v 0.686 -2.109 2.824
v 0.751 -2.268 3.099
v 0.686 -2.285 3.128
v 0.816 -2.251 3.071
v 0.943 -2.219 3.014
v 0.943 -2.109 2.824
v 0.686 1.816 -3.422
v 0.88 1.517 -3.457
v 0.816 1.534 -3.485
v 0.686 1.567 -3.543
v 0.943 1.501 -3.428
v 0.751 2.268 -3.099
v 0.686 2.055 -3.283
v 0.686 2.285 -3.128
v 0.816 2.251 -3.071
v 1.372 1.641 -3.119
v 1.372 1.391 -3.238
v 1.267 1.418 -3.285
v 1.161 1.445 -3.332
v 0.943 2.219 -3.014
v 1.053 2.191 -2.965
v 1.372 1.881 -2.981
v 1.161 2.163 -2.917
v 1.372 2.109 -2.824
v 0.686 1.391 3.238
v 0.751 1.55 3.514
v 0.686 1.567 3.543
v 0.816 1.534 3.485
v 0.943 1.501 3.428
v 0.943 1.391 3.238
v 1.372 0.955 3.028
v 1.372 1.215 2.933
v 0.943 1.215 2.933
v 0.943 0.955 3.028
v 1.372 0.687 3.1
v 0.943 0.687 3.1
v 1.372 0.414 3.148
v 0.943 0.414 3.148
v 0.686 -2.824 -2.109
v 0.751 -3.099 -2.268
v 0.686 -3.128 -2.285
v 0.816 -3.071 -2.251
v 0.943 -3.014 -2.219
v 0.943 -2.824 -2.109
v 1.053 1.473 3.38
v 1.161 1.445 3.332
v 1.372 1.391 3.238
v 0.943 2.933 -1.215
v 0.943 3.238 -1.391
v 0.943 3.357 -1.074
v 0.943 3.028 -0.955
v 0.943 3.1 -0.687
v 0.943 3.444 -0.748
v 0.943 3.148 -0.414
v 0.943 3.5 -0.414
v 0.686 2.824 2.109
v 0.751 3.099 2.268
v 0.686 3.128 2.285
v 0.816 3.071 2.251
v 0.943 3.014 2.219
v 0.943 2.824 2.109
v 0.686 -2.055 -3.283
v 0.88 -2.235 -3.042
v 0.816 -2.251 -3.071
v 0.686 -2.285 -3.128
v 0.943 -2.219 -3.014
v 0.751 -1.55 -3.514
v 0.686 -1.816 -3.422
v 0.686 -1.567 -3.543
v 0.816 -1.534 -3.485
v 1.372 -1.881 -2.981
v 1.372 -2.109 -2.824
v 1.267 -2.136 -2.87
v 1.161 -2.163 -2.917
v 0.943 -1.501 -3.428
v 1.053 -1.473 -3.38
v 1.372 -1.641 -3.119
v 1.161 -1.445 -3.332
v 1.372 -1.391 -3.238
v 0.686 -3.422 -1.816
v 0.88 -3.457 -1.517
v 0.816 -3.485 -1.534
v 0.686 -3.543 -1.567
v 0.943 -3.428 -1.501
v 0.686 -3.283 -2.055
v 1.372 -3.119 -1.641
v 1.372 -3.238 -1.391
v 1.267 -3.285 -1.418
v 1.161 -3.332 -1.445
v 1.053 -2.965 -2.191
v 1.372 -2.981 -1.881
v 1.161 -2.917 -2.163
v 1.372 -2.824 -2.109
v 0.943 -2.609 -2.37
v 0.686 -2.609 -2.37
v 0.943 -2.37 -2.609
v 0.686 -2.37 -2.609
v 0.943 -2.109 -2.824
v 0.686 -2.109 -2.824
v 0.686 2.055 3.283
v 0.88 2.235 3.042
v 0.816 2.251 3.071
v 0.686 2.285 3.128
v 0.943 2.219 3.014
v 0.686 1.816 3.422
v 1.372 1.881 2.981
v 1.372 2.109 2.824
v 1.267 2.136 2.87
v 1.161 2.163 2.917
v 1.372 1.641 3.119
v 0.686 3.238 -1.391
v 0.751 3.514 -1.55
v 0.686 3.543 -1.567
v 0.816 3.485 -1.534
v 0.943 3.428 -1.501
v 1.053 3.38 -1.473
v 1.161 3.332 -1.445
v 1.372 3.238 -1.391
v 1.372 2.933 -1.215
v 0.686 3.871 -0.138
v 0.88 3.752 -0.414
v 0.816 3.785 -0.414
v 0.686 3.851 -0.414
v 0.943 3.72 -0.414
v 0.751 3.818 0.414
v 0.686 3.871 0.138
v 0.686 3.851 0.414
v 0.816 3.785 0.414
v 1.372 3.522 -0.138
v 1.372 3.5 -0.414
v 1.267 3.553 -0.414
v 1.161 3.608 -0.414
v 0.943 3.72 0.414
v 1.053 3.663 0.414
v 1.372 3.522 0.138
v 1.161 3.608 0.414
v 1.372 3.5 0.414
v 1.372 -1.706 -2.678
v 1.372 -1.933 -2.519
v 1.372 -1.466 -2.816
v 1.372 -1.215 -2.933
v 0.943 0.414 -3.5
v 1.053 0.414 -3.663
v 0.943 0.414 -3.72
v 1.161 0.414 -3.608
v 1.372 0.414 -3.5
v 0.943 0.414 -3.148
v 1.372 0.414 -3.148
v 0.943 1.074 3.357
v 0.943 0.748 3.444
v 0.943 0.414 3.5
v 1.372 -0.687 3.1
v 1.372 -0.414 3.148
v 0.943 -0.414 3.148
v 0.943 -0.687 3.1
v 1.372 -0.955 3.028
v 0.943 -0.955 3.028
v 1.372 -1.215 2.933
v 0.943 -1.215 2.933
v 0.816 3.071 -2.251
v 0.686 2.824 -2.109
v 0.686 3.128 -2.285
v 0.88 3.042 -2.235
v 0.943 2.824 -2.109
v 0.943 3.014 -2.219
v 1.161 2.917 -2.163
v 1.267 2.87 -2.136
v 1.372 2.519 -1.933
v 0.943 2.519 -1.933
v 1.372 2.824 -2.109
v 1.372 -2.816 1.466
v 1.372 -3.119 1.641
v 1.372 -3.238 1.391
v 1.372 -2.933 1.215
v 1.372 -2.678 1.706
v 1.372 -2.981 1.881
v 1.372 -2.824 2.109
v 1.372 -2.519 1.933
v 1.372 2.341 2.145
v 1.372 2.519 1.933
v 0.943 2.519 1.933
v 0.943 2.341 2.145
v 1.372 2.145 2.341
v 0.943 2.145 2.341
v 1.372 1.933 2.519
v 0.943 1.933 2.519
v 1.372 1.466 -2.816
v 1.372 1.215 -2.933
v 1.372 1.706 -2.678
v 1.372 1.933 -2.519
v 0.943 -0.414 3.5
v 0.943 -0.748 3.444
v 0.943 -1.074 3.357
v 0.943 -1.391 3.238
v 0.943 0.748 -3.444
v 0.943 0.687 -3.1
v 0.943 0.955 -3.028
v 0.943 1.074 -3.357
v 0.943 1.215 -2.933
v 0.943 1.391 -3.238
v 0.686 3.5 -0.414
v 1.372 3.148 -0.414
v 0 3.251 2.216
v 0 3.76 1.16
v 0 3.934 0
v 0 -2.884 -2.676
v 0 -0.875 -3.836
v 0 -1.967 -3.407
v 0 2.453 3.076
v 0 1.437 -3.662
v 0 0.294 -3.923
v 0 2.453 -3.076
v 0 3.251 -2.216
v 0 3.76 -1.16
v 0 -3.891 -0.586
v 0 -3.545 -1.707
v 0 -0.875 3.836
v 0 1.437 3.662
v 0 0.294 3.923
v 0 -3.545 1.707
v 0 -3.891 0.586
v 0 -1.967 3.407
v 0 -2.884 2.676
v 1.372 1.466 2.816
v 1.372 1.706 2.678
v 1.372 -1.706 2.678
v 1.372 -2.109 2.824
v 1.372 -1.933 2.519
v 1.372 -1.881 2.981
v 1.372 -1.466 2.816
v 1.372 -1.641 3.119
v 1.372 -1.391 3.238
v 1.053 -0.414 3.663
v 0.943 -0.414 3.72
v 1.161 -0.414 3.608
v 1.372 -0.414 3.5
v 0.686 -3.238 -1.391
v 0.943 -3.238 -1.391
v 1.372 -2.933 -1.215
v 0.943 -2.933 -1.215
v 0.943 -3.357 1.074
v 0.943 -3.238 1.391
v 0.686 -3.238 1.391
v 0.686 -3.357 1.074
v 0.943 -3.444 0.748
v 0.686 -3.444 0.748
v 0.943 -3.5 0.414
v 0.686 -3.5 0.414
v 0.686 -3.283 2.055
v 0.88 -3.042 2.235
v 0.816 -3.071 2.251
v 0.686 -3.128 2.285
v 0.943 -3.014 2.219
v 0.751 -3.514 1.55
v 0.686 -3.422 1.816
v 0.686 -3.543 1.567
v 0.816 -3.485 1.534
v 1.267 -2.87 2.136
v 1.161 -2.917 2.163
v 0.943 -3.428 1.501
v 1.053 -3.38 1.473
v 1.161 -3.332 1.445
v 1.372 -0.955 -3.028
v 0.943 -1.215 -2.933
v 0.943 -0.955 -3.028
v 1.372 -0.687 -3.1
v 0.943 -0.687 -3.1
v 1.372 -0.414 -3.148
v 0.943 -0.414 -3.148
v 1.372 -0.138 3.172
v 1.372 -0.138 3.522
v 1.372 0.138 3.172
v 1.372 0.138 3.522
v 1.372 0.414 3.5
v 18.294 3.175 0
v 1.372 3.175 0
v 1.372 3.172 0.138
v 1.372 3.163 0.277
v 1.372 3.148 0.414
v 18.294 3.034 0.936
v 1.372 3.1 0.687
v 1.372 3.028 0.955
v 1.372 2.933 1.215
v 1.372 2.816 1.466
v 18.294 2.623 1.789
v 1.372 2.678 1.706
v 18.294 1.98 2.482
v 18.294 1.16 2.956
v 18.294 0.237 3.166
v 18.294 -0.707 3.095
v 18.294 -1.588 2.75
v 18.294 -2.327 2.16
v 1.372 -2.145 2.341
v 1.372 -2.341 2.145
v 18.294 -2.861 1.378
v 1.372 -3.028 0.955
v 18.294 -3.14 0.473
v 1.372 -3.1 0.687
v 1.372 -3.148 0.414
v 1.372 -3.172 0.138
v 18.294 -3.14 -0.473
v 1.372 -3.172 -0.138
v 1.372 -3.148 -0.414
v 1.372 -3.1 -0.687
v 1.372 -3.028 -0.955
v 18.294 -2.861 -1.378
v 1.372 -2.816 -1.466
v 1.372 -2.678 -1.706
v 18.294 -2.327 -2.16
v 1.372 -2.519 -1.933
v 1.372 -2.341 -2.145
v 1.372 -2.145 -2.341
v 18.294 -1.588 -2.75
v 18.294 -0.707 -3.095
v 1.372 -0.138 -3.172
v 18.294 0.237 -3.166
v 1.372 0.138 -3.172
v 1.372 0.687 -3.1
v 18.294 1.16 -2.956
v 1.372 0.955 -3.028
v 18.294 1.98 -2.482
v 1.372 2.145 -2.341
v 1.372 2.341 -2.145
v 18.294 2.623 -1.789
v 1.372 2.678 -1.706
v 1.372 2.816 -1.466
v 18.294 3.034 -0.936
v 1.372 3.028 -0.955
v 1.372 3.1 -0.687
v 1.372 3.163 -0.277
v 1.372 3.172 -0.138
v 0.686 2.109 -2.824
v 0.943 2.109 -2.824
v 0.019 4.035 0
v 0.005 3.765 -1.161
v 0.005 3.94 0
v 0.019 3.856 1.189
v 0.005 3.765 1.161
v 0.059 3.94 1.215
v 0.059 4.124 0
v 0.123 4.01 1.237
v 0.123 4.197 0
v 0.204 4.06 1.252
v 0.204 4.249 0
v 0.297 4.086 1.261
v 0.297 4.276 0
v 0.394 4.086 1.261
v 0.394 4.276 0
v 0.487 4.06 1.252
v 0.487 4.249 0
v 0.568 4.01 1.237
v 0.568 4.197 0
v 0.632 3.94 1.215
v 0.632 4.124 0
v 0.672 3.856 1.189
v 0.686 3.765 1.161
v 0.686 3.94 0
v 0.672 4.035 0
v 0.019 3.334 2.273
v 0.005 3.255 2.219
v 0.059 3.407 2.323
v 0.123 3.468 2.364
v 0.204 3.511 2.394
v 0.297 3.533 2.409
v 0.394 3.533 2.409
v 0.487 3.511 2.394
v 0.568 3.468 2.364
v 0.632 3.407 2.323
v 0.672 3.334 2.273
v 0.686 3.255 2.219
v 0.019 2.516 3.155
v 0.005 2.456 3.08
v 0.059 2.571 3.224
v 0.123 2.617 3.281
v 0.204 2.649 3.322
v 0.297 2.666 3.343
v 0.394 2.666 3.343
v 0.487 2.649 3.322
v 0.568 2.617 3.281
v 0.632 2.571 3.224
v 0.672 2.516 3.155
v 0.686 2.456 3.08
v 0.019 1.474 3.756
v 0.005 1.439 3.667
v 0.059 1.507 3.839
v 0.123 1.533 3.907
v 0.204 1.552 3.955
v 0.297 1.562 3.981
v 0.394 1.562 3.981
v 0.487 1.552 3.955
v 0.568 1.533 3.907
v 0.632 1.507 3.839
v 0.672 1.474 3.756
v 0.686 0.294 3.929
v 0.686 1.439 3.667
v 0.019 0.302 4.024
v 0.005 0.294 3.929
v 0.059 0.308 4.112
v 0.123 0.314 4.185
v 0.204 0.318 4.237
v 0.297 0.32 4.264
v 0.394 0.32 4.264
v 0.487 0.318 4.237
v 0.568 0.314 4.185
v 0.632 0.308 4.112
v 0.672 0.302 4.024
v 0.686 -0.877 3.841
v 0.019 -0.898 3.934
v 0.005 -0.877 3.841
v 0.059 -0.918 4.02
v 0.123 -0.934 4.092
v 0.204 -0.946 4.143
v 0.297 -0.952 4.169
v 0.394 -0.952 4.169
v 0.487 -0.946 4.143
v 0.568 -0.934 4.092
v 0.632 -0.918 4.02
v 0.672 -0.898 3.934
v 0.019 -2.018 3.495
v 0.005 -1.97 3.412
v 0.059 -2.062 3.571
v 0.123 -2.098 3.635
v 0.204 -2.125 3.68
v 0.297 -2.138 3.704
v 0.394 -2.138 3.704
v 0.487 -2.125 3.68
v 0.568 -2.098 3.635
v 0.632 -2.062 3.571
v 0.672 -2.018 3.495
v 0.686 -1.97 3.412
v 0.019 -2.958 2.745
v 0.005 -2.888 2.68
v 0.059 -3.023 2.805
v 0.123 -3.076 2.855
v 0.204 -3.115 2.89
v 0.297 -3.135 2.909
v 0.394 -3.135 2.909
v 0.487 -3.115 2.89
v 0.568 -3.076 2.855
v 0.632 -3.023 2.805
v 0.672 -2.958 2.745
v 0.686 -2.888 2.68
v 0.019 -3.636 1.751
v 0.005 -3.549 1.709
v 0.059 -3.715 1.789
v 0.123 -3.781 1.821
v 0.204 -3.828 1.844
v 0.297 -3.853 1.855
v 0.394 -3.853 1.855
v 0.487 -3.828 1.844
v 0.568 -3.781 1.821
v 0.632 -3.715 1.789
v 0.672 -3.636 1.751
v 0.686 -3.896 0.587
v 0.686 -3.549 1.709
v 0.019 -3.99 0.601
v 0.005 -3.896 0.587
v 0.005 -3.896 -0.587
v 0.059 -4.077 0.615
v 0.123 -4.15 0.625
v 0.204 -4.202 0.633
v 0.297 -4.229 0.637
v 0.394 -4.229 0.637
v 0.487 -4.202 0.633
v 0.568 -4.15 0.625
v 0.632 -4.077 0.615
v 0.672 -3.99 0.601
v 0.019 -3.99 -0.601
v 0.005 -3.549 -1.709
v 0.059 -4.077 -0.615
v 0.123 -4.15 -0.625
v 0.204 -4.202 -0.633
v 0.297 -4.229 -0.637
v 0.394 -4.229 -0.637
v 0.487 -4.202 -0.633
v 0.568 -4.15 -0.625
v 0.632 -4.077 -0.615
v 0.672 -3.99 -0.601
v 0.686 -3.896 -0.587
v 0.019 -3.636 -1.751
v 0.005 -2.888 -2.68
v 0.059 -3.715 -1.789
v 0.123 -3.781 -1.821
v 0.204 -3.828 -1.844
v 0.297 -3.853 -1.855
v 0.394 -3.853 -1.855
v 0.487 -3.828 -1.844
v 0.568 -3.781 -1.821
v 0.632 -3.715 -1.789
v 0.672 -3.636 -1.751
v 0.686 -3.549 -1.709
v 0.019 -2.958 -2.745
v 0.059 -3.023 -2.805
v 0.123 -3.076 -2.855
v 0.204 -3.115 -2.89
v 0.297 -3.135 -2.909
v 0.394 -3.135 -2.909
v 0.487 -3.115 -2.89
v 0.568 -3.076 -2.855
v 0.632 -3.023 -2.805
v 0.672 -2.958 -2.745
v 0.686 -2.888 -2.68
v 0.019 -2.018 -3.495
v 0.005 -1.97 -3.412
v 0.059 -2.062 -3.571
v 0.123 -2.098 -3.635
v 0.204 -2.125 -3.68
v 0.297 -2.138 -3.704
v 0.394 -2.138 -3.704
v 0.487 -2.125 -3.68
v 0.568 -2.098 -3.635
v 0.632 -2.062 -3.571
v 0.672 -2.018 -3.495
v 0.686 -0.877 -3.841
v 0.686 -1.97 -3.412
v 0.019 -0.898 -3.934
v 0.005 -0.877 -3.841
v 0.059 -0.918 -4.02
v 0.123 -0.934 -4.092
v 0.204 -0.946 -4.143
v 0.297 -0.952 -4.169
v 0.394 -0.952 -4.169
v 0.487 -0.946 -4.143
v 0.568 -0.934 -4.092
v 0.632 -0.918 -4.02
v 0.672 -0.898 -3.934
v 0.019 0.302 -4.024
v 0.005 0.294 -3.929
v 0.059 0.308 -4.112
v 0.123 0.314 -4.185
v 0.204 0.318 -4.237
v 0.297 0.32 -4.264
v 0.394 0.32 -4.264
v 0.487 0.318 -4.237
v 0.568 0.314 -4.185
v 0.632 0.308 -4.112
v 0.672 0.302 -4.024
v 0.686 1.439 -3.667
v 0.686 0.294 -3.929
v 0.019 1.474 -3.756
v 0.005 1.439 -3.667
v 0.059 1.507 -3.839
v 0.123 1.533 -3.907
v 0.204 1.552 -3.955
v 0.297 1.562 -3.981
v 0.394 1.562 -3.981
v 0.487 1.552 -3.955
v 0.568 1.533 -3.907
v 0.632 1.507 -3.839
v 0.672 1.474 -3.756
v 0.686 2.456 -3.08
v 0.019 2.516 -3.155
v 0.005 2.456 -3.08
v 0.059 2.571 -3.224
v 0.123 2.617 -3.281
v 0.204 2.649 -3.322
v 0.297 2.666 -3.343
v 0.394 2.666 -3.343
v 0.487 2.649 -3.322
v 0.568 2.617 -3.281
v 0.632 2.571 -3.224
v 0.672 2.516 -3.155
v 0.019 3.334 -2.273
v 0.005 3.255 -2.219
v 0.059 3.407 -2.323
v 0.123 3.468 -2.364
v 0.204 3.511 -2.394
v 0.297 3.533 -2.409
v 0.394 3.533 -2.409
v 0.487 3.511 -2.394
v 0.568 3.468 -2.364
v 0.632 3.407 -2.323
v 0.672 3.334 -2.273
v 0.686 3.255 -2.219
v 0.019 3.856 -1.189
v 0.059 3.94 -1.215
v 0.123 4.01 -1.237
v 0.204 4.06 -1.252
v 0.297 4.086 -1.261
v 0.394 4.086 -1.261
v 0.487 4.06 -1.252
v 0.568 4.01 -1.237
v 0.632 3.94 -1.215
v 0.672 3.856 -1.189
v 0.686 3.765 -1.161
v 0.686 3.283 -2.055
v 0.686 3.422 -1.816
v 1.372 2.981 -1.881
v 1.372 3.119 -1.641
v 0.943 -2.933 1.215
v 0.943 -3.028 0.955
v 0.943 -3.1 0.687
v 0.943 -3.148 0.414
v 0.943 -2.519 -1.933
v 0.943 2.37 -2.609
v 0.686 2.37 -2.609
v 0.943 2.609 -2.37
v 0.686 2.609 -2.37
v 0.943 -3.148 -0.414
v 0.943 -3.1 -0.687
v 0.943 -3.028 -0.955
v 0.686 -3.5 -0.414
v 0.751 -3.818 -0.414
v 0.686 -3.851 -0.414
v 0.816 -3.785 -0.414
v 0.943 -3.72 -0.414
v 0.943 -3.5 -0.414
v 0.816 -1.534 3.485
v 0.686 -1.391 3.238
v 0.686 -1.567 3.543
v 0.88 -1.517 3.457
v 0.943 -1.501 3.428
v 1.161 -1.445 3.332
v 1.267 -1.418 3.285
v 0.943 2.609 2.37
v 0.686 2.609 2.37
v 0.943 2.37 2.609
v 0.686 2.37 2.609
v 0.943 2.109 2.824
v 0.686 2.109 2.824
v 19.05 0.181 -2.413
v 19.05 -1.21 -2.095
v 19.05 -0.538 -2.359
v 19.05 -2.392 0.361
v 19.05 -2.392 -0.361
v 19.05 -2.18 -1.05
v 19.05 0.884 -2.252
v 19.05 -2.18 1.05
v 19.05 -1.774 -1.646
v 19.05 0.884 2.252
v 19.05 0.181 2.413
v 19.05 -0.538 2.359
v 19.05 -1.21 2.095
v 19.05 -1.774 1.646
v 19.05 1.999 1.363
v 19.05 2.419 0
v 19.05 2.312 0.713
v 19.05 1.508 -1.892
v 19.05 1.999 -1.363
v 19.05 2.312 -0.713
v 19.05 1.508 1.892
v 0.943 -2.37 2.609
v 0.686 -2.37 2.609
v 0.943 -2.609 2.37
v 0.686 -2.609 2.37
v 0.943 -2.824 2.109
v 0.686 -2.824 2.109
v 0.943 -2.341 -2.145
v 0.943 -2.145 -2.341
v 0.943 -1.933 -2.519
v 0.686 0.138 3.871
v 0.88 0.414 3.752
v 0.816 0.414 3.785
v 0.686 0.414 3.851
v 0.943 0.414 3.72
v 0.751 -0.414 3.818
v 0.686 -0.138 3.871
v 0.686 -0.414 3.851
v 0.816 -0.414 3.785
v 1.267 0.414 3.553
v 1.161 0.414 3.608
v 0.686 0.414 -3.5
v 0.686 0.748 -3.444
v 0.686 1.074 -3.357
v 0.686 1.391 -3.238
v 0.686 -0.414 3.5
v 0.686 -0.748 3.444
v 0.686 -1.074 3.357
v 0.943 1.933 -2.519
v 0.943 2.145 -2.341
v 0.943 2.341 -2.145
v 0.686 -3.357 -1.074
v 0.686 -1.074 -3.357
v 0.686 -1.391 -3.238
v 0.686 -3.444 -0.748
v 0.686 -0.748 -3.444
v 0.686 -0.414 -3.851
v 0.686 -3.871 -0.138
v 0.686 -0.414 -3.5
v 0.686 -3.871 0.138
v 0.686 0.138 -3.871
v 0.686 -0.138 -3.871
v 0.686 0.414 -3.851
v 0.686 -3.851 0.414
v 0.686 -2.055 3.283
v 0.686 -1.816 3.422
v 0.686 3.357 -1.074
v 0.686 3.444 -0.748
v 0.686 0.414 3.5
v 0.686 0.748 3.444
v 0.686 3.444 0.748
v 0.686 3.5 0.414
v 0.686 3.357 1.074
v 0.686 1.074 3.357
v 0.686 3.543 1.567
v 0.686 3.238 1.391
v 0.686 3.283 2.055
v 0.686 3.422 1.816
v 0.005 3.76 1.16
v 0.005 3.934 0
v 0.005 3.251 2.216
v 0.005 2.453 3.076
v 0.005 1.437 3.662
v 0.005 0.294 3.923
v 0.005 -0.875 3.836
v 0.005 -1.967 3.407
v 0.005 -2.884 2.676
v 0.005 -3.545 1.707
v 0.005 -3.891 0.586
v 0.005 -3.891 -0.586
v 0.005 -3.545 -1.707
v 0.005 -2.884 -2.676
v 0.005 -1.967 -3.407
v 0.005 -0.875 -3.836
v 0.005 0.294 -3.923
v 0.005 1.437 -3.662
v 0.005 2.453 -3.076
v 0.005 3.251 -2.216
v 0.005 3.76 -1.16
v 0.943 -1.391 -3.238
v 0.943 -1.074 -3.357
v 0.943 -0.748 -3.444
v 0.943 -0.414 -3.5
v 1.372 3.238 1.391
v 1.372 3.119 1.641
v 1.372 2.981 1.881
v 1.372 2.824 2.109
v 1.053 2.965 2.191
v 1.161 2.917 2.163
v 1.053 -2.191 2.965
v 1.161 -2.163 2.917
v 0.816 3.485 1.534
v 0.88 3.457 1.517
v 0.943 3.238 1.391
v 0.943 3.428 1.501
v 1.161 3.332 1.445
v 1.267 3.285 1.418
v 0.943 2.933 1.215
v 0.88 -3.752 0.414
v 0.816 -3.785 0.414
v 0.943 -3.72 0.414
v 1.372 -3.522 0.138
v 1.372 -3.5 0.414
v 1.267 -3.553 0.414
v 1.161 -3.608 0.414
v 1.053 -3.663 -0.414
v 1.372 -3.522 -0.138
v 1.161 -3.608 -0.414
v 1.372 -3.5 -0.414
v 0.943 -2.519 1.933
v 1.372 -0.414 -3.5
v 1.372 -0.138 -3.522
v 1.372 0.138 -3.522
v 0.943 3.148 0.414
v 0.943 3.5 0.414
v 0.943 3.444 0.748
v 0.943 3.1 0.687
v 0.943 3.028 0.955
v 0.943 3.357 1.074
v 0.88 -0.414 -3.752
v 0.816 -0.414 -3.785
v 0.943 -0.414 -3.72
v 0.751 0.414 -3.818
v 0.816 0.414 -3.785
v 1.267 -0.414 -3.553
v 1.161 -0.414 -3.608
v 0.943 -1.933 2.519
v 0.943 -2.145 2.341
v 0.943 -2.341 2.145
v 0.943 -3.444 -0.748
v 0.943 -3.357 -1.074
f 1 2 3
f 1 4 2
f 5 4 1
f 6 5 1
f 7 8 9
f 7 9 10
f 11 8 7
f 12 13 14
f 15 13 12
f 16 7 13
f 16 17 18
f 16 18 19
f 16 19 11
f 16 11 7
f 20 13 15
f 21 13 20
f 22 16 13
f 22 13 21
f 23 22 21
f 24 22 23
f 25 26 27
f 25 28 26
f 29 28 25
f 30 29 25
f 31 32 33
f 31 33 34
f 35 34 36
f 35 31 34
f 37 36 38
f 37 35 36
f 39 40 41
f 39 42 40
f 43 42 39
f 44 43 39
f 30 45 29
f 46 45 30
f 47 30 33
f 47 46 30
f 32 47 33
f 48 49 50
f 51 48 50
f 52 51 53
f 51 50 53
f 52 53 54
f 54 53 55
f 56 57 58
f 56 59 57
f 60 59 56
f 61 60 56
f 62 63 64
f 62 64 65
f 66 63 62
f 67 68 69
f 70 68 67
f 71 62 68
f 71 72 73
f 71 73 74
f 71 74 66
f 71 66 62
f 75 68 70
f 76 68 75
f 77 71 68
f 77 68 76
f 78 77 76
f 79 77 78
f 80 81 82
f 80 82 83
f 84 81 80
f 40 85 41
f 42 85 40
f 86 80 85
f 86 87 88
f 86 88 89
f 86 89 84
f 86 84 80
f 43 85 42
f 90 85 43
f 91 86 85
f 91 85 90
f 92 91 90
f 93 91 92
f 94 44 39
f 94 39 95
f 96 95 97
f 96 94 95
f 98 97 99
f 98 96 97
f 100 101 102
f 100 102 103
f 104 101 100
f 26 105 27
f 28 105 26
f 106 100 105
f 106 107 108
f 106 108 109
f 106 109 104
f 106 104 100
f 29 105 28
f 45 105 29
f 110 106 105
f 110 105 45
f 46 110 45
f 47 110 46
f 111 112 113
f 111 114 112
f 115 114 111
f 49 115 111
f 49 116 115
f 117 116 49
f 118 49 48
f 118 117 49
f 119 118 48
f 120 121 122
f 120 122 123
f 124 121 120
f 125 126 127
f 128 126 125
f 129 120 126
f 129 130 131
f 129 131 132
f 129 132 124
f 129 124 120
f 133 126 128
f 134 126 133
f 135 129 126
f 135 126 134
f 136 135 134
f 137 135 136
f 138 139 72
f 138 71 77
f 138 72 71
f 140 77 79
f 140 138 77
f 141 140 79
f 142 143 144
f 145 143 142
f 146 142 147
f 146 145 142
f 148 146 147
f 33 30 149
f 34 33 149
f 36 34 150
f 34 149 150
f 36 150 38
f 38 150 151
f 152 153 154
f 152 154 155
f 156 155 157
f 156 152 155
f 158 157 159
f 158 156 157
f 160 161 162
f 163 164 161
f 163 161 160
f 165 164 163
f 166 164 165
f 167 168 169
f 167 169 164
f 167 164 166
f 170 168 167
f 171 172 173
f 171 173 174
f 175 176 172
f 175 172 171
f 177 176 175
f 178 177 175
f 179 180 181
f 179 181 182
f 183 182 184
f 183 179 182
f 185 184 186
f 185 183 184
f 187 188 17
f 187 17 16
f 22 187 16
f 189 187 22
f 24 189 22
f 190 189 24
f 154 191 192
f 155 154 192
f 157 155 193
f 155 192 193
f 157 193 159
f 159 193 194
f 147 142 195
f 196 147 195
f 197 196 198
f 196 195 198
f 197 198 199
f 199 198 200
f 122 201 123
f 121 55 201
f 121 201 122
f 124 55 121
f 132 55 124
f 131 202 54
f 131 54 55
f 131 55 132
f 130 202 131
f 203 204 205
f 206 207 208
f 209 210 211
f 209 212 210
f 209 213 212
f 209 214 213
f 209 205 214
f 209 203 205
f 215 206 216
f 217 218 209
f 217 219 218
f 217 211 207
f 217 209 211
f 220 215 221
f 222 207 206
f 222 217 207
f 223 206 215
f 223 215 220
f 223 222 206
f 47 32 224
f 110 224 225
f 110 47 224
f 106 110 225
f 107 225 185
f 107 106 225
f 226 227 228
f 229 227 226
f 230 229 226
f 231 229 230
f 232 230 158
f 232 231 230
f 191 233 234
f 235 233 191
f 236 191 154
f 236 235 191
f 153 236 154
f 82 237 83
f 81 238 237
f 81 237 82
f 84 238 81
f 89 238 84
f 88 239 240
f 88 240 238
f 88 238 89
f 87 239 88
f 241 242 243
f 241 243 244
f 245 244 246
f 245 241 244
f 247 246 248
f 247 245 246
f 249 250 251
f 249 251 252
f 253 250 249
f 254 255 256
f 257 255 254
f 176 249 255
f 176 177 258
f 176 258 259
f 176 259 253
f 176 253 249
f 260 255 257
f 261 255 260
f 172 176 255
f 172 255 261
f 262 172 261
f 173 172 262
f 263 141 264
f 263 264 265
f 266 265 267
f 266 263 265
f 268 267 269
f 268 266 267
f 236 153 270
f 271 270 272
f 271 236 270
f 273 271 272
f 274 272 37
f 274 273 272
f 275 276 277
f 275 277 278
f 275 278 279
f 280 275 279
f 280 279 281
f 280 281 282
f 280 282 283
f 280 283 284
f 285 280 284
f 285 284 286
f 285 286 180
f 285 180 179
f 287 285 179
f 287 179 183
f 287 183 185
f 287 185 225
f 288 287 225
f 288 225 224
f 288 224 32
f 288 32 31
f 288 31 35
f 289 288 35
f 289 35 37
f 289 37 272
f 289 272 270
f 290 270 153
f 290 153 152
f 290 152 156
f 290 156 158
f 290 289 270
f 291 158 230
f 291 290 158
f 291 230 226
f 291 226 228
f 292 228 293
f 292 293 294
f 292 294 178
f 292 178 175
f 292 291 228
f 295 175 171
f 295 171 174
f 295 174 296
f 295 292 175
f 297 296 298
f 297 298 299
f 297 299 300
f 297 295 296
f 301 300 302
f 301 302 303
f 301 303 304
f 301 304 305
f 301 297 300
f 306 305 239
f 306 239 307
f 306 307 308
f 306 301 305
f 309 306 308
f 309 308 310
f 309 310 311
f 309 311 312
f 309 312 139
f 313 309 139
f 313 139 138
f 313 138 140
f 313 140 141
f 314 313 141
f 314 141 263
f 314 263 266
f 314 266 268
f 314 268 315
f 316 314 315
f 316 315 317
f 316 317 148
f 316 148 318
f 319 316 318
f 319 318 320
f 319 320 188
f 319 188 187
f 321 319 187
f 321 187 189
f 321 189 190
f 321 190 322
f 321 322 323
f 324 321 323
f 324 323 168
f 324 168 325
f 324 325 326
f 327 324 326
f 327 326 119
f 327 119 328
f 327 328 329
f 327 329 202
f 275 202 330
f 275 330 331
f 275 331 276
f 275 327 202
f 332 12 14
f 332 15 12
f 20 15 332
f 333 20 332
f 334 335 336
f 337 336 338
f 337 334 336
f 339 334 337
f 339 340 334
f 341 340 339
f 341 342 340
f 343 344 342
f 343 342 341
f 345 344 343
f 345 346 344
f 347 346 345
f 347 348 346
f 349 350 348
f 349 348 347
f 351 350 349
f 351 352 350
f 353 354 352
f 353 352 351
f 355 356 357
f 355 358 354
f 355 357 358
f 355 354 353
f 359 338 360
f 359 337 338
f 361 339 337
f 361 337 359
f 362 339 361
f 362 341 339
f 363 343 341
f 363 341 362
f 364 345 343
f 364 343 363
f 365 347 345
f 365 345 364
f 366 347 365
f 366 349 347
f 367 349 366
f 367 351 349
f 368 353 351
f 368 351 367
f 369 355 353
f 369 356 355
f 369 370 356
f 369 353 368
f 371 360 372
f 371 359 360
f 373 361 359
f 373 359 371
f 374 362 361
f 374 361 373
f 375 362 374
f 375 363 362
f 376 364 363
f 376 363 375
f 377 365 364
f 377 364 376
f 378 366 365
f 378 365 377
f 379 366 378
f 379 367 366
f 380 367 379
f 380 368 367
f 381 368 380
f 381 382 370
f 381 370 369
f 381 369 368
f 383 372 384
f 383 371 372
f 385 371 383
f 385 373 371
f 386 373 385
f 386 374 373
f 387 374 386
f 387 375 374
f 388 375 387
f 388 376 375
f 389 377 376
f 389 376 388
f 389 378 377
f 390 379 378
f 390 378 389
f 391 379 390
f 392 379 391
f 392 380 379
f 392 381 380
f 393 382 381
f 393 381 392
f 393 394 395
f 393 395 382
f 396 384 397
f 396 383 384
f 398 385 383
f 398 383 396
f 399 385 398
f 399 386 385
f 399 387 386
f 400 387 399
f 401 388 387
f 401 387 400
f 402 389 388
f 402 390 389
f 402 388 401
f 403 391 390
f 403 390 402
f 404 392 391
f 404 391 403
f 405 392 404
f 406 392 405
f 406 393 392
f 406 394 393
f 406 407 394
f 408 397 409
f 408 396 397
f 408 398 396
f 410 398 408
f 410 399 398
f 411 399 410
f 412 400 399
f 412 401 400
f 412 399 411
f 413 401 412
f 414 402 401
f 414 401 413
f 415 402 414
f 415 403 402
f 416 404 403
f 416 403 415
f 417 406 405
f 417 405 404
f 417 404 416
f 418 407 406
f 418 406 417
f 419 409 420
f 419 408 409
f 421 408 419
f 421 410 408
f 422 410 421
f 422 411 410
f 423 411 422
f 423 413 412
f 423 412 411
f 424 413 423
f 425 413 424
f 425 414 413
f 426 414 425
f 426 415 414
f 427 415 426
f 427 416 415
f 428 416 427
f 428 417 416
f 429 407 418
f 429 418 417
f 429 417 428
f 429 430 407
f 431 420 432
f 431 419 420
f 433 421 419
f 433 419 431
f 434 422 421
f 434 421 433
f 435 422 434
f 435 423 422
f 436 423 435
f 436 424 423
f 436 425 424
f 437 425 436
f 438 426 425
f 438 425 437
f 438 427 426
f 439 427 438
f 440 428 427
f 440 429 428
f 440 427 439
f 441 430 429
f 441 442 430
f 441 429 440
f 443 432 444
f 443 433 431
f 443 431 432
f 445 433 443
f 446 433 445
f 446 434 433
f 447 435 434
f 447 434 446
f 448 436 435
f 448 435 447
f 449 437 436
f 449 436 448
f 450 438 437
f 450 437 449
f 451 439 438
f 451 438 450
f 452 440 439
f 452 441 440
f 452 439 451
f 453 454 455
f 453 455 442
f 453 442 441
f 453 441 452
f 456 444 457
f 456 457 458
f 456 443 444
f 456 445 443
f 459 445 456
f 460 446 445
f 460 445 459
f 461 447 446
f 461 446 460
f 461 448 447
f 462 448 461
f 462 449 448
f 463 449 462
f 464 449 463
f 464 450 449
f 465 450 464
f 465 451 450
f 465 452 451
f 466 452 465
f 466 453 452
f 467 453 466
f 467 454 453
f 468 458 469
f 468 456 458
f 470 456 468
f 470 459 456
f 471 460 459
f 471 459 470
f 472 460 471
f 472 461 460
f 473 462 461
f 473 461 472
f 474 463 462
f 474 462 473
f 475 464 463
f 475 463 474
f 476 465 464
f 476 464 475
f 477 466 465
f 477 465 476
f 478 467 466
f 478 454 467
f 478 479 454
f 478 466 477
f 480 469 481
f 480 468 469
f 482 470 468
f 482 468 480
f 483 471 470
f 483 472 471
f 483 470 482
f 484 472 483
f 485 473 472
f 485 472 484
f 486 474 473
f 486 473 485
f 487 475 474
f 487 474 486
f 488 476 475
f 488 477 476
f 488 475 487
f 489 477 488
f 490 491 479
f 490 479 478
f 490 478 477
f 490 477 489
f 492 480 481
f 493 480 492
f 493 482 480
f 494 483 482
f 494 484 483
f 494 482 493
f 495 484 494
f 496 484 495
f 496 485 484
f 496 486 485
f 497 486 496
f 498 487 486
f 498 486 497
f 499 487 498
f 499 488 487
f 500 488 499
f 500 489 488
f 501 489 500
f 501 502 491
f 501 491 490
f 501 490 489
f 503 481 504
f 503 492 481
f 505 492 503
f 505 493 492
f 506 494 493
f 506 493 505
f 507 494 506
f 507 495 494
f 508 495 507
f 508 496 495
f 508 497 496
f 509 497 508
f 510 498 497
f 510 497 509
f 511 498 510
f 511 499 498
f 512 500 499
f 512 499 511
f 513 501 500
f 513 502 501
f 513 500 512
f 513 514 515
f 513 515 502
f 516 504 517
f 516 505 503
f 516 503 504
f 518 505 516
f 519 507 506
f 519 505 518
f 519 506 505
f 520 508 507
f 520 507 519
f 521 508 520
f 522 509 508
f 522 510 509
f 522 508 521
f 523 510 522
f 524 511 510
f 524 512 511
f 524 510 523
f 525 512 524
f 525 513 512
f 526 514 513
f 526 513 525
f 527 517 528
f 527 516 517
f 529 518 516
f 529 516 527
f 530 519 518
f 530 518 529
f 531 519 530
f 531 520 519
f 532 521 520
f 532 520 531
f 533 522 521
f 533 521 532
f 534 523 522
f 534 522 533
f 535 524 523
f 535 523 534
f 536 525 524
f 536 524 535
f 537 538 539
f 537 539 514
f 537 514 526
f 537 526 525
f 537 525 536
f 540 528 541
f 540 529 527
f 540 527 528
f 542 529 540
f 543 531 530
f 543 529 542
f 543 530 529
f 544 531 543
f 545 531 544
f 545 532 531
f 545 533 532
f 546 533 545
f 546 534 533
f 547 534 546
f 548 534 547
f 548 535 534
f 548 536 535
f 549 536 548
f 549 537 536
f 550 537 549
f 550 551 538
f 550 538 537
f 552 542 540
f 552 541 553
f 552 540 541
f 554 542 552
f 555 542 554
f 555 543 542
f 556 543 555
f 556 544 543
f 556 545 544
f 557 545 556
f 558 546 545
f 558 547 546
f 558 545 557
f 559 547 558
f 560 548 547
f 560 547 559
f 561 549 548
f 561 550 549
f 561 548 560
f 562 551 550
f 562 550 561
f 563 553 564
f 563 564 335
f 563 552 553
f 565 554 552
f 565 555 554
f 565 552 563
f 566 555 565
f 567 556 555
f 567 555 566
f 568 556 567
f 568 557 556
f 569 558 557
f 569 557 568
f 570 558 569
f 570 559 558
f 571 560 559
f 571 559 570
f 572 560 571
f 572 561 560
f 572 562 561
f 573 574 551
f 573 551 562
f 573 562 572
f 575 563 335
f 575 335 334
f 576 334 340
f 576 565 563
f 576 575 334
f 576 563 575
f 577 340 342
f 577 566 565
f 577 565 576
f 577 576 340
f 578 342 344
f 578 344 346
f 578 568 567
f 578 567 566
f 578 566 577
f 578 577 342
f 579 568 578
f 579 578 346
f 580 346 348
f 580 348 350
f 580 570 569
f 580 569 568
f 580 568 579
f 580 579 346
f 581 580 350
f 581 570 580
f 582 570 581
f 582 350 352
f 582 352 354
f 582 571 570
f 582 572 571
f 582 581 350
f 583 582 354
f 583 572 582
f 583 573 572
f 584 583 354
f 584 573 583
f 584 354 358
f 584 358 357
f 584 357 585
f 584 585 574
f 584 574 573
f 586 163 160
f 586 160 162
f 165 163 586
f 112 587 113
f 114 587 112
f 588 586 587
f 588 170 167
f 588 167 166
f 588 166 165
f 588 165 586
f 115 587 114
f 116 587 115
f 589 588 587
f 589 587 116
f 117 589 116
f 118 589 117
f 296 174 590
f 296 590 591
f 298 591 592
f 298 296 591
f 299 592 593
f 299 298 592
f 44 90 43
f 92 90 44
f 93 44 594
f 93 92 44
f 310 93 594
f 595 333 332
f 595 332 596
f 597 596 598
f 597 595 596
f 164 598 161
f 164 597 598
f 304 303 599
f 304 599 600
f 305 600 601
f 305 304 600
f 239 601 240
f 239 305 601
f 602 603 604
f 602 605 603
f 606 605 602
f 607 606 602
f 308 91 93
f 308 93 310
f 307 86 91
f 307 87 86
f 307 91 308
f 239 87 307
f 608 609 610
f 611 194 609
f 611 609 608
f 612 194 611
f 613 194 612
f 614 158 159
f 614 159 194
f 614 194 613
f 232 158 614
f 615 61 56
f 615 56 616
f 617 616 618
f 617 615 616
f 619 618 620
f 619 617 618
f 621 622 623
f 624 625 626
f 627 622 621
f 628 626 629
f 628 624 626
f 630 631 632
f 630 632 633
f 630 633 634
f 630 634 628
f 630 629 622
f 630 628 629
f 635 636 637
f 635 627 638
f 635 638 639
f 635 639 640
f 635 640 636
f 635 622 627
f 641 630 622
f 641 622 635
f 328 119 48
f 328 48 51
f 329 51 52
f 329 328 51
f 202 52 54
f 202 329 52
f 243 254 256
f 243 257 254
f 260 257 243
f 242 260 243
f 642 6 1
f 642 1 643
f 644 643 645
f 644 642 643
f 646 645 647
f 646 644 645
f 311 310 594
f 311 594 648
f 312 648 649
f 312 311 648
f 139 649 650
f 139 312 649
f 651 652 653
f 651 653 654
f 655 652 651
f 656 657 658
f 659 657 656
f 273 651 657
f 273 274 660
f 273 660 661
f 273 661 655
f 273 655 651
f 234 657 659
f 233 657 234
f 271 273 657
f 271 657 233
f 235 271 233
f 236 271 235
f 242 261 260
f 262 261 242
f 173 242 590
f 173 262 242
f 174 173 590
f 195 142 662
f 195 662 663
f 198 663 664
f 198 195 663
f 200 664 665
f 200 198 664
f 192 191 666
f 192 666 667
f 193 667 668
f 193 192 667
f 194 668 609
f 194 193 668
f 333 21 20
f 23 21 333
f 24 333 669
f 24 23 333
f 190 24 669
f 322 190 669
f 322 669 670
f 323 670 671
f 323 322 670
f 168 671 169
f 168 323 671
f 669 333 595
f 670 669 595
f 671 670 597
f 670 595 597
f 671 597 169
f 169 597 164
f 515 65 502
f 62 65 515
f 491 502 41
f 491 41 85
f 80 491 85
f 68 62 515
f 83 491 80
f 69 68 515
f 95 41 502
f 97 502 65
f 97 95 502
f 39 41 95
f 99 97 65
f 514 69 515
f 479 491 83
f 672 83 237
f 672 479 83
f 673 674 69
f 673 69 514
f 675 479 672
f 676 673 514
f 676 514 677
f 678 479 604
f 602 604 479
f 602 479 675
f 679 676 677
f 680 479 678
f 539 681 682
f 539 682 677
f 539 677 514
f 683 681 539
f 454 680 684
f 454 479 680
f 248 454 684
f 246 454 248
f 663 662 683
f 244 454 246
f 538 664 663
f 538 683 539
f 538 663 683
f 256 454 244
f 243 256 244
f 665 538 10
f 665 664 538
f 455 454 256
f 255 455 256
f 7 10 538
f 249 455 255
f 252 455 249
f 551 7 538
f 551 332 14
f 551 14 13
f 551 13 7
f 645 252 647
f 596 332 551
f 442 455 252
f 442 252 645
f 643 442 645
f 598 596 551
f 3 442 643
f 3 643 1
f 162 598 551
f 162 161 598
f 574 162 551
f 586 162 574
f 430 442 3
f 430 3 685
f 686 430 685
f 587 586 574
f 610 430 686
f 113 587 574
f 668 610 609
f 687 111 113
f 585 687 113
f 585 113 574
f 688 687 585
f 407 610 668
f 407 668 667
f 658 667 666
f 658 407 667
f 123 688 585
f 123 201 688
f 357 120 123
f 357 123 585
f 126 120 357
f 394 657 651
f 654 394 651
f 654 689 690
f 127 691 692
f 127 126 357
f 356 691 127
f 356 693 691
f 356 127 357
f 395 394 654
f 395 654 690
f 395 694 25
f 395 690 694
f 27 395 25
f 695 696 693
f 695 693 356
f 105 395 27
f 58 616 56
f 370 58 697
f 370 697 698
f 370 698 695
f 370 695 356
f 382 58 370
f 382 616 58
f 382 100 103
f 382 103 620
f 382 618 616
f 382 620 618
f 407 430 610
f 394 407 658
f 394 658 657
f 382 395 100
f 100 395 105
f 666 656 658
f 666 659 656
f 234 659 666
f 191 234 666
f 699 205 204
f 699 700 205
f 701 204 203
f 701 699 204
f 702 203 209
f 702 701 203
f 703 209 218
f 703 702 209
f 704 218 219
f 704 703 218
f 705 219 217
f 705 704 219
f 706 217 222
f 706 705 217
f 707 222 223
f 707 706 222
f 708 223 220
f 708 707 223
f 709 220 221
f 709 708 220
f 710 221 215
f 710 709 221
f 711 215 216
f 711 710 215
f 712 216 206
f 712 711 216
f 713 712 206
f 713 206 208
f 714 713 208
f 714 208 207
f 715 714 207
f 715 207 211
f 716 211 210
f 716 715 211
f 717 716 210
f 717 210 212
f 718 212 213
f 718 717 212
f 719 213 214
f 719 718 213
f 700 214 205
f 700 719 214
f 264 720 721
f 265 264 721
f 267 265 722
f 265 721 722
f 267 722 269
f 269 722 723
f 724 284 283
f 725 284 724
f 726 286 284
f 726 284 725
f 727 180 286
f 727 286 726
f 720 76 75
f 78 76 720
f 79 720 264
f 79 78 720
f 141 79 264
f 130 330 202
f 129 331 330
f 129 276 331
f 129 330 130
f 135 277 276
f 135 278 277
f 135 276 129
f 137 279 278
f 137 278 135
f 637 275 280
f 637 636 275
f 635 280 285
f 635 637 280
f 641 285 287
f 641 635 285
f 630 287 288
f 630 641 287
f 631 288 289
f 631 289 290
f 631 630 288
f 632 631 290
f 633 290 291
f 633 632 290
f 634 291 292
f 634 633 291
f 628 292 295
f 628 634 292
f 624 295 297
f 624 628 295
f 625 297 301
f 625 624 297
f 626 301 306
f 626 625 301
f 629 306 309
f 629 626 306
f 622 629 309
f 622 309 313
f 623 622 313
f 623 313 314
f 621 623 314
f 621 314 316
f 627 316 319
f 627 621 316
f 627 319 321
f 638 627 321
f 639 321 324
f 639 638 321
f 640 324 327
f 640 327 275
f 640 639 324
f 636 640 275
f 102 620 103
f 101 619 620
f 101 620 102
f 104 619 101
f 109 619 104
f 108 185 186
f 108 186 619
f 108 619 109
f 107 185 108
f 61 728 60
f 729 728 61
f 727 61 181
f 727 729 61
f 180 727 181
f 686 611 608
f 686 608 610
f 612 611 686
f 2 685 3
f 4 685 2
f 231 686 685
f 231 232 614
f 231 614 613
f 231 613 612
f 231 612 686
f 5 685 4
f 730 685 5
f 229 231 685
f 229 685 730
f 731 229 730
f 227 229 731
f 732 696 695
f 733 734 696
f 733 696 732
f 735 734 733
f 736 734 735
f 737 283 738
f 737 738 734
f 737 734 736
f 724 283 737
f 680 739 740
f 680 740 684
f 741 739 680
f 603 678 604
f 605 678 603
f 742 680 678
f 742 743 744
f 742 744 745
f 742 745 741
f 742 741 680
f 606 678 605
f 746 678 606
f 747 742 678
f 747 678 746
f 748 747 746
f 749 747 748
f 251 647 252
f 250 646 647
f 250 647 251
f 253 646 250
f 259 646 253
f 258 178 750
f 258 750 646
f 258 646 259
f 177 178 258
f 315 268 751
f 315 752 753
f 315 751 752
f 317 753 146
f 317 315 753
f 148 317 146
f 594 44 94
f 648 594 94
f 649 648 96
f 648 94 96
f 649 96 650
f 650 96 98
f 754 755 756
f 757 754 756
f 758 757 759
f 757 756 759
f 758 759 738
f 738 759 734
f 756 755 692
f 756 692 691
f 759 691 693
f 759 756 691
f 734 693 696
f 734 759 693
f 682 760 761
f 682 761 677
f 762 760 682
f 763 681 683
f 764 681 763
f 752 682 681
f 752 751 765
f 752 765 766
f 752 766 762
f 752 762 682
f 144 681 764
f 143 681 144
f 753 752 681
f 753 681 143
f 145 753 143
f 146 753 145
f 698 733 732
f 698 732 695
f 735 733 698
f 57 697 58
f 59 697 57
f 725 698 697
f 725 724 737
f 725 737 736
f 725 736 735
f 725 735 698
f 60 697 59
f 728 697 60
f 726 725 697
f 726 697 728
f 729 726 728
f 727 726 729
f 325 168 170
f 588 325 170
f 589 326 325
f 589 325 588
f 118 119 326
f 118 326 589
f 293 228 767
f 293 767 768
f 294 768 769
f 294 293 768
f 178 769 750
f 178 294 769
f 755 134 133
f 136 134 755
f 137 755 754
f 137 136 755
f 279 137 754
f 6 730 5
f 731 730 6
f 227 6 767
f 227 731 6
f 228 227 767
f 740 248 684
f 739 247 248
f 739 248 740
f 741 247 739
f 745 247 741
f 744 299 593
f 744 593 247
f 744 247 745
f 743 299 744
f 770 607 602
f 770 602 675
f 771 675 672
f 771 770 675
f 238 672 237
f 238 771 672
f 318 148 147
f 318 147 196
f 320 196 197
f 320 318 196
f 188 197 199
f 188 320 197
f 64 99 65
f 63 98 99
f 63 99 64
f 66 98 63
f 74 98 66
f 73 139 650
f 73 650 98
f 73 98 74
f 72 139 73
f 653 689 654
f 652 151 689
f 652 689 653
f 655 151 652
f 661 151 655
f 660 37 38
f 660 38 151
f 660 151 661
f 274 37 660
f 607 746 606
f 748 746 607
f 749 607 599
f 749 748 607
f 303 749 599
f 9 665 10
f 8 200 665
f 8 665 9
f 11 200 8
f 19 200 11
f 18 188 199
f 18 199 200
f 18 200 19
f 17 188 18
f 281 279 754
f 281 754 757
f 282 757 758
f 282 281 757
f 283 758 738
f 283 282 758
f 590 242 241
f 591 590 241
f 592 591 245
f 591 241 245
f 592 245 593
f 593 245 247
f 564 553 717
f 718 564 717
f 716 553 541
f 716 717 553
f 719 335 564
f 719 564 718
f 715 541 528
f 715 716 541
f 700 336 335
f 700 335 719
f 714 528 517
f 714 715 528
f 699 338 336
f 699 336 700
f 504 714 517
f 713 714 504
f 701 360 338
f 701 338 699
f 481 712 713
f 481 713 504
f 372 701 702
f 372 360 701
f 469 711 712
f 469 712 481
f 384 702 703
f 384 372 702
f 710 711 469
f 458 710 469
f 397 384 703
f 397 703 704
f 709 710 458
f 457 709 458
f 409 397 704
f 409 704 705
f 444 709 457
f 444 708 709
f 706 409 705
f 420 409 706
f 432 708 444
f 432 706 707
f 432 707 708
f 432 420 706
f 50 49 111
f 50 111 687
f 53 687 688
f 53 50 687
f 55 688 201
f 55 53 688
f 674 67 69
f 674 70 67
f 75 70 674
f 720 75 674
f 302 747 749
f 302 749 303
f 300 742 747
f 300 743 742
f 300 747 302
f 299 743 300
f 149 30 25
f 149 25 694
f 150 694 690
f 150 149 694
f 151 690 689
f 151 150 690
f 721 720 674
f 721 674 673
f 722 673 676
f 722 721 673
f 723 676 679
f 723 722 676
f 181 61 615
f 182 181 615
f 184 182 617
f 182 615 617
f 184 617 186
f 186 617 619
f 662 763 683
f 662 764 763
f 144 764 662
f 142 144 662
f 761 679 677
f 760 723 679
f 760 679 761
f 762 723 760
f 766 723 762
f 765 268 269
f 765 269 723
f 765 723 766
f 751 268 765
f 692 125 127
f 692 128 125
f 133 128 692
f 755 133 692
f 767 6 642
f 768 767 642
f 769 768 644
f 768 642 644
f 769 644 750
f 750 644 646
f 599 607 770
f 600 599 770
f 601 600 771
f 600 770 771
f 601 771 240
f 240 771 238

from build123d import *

# Parameters (mm, degrees)
RIBCUT1_DEPTH    = 0.428625
RIBCUT2_DEPTH    = 0.6858
RIBCUTSPAT_COUNT = 12
RIBCUTSPAT_ANGLE = 330


with BuildPart() as part:
    # BodySke → BaseBody (revolve)
    with BuildSketch(Plane.XY):
        with BuildLine():
            Line((0, 0), (0, 3.93446))
            Line((0, 3.93446), (0.00508, 3.93446))
            Line((0.00508, 3.93446), (0.00508, 3.93954))
            ThreePointArc((0.00508, 3.93954), (0.34544, 4.2799), (0.6858, 3.93954))
            Line((0.6858, 3.93954), (0.6858, 3.8735))
            Line((0.6858, 3.8735), (1.3716, 3.52425))
            Line((1.3716, 3.52425), (1.3716, 3.175))
            Line((1.3716, 3.175), (18.29435, 3.175))
            Line((18.29435, 3.175), (19.05, 2.41935))
            Line((19.05, 2.41935), (19.05, 0))
            Line((19.05, 0), (0, 0))
        make_face()
    revolve(axis=Axis((0, 0, 0), (1, 0, 0)))

    # RibCut1Ske → RibCut1 (cut)
    with BuildSketch(Plane(origin=(1.3716, 0, 0), x_dir=(0, 0, -1), z_dir=(1, 0, 0))):
        with BuildLine():
            Line((0.41442066, 3.147837435), (0.41442066, 4.259788672))
            ThreePointArc((0.41442066, 4.259788672), (1.107719631, 4.134065944), (1.770995516, 3.896295534))
            Line((1.770995516, 3.896295534), (1.215019898, 2.933317516))
            ThreePointArc((1.215019898, 2.933317516), (0.821750468, 3.066814498), (0.41442066, 3.147837435))
        make_face()
    ribcut1 = extrude(amount=-RIBCUT1_DEPTH, mode=Mode.SUBTRACT)

    # RibCut2Ske → RibCut2 (cut)
    with BuildSketch(Plane(origin=(1.3716, 0, 0), x_dir=(0, 0, -1), z_dir=(1, 0, 0))):
        with BuildLine():
            Line((0.41442066, 3.499799077), (0.41442066, 4.259788672))
            ThreePointArc((0.41442066, 4.259788672), (1.107719631, 4.134065944), (1.770995516, 3.896295534))
            Line((1.770995516, 3.896295534), (1.391000719, 3.238125239))
            ThreePointArc((1.391000719, 3.238125239), (0.91214302, 3.404164093), (0.41442066, 3.499799077))
        make_face()
    ribcut2 = extrude(amount=-RIBCUT2_DEPTH, mode=Mode.SUBTRACT)

    # RibCutsPat: RibCut1, RibCut2 ×12 about axis
    ribcutspat_axis = Axis((0, 0, 0), (1, 0, 0))
    for i in range(1, RIBCUTSPAT_COUNT):
        add(ribcut1.rotate(ribcutspat_axis, i * RIBCUTSPAT_ANGLE / (RIBCUTSPAT_COUNT - 1)), mode=Mode.SUBTRACT)
        add(ribcut2.rotate(ribcutspat_axis, i * RIBCUTSPAT_ANGLE / (RIBCUTSPAT_COUNT - 1)), mode=Mode.SUBTRACT)


solid = part.part
